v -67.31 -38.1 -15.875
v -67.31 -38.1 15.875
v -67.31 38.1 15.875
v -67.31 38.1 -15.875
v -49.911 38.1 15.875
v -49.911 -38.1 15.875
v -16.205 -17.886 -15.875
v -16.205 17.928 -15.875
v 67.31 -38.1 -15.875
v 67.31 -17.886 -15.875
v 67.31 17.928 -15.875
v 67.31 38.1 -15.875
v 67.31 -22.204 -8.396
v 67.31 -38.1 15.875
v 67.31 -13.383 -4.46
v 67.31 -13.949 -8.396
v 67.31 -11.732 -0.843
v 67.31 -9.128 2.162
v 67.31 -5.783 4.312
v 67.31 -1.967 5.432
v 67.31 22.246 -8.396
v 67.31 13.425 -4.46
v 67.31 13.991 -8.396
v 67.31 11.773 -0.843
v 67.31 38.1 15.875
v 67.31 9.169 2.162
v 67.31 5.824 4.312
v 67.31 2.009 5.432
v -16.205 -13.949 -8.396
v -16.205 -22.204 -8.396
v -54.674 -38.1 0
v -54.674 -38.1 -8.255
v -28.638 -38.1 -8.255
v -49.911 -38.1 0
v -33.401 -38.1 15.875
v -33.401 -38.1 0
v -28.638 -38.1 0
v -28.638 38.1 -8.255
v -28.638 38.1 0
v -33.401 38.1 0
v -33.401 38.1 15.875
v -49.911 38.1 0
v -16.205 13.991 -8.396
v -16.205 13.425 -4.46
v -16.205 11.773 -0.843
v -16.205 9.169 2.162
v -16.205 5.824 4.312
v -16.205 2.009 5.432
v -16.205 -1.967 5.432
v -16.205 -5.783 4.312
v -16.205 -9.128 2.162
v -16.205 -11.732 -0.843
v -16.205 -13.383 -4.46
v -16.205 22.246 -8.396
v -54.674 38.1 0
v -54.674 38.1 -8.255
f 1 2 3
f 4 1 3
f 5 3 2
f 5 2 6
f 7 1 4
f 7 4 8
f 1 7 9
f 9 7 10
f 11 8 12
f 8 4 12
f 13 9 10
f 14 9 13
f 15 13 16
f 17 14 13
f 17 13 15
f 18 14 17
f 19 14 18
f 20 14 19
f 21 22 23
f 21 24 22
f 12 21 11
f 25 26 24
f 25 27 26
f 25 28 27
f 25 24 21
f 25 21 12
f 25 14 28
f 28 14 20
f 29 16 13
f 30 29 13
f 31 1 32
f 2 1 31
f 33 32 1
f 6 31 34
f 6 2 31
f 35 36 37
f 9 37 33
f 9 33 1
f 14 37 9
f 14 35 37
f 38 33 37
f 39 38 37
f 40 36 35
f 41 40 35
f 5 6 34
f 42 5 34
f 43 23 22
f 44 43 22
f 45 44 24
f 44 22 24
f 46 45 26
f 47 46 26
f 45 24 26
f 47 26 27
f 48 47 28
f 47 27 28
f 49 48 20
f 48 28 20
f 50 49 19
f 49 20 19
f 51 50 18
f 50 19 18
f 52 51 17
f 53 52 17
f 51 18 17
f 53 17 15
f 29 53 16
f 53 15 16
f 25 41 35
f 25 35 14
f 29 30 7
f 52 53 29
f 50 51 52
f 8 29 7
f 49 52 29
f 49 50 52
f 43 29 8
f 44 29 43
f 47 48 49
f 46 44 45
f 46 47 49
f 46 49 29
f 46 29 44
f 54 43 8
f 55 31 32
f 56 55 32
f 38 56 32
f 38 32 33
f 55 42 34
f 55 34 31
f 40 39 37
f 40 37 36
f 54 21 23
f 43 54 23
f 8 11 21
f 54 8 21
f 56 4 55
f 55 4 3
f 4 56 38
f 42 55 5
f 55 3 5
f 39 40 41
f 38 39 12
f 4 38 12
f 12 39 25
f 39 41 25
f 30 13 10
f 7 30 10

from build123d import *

# Parameters (mm, degrees)
F0_W     = 134.62
F0_H     = 76.2
F1_DEPTH = 15.875
F3_DEPTH = 76.201
F5_DEPTH = 83.5152


with BuildPart() as f1:
    # F0 (on Top) → F1 (new body, symmetric)
    with BuildSketch(Plane.XY):
        Rectangle(F0_W, F0_H)
    extrude(amount=F1_DEPTH, both=True)

    # F2 (on face) → F3 (cut, through all)
    with BuildSketch(Plane.XZ.offset(38.1)):
        Polygon((-33.401, 15.875), (-49.911, 15.875), (-49.911, 0), (-54.6735, 0), (-54.6735, -8.255), (-28.6385, -8.255), (-28.6385, 0), (-33.401, 0), align=None)
    extrude(amount=-F3_DEPTH, mode=Mode.SUBTRACT)

    # F4 (on face) → F5 (cut)
    with BuildSketch(Plane.YZ.offset(67.31)):
        with BuildLine():
            ThreePointArc((13.990774, -8.396005), (0.020774, 5.573995), (-13.949226, -8.396005))
            Line((-13.949226, -8.396005), (13.990774, -8.396005))
        make_face()
        Polygon((-13.949226, -8.396005), (-22.204226, -8.396005), (-17.886226, -15.875), (17.927774, -15.875), (22.245774, -8.396005), (13.990774, -8.396005), align=None)
    extrude(amount=-F5_DEPTH, mode=Mode.SUBTRACT)


with BuildPart() as f6_1:
    # F6: copy of F1
    add(f1.part)


solid = f1.part
